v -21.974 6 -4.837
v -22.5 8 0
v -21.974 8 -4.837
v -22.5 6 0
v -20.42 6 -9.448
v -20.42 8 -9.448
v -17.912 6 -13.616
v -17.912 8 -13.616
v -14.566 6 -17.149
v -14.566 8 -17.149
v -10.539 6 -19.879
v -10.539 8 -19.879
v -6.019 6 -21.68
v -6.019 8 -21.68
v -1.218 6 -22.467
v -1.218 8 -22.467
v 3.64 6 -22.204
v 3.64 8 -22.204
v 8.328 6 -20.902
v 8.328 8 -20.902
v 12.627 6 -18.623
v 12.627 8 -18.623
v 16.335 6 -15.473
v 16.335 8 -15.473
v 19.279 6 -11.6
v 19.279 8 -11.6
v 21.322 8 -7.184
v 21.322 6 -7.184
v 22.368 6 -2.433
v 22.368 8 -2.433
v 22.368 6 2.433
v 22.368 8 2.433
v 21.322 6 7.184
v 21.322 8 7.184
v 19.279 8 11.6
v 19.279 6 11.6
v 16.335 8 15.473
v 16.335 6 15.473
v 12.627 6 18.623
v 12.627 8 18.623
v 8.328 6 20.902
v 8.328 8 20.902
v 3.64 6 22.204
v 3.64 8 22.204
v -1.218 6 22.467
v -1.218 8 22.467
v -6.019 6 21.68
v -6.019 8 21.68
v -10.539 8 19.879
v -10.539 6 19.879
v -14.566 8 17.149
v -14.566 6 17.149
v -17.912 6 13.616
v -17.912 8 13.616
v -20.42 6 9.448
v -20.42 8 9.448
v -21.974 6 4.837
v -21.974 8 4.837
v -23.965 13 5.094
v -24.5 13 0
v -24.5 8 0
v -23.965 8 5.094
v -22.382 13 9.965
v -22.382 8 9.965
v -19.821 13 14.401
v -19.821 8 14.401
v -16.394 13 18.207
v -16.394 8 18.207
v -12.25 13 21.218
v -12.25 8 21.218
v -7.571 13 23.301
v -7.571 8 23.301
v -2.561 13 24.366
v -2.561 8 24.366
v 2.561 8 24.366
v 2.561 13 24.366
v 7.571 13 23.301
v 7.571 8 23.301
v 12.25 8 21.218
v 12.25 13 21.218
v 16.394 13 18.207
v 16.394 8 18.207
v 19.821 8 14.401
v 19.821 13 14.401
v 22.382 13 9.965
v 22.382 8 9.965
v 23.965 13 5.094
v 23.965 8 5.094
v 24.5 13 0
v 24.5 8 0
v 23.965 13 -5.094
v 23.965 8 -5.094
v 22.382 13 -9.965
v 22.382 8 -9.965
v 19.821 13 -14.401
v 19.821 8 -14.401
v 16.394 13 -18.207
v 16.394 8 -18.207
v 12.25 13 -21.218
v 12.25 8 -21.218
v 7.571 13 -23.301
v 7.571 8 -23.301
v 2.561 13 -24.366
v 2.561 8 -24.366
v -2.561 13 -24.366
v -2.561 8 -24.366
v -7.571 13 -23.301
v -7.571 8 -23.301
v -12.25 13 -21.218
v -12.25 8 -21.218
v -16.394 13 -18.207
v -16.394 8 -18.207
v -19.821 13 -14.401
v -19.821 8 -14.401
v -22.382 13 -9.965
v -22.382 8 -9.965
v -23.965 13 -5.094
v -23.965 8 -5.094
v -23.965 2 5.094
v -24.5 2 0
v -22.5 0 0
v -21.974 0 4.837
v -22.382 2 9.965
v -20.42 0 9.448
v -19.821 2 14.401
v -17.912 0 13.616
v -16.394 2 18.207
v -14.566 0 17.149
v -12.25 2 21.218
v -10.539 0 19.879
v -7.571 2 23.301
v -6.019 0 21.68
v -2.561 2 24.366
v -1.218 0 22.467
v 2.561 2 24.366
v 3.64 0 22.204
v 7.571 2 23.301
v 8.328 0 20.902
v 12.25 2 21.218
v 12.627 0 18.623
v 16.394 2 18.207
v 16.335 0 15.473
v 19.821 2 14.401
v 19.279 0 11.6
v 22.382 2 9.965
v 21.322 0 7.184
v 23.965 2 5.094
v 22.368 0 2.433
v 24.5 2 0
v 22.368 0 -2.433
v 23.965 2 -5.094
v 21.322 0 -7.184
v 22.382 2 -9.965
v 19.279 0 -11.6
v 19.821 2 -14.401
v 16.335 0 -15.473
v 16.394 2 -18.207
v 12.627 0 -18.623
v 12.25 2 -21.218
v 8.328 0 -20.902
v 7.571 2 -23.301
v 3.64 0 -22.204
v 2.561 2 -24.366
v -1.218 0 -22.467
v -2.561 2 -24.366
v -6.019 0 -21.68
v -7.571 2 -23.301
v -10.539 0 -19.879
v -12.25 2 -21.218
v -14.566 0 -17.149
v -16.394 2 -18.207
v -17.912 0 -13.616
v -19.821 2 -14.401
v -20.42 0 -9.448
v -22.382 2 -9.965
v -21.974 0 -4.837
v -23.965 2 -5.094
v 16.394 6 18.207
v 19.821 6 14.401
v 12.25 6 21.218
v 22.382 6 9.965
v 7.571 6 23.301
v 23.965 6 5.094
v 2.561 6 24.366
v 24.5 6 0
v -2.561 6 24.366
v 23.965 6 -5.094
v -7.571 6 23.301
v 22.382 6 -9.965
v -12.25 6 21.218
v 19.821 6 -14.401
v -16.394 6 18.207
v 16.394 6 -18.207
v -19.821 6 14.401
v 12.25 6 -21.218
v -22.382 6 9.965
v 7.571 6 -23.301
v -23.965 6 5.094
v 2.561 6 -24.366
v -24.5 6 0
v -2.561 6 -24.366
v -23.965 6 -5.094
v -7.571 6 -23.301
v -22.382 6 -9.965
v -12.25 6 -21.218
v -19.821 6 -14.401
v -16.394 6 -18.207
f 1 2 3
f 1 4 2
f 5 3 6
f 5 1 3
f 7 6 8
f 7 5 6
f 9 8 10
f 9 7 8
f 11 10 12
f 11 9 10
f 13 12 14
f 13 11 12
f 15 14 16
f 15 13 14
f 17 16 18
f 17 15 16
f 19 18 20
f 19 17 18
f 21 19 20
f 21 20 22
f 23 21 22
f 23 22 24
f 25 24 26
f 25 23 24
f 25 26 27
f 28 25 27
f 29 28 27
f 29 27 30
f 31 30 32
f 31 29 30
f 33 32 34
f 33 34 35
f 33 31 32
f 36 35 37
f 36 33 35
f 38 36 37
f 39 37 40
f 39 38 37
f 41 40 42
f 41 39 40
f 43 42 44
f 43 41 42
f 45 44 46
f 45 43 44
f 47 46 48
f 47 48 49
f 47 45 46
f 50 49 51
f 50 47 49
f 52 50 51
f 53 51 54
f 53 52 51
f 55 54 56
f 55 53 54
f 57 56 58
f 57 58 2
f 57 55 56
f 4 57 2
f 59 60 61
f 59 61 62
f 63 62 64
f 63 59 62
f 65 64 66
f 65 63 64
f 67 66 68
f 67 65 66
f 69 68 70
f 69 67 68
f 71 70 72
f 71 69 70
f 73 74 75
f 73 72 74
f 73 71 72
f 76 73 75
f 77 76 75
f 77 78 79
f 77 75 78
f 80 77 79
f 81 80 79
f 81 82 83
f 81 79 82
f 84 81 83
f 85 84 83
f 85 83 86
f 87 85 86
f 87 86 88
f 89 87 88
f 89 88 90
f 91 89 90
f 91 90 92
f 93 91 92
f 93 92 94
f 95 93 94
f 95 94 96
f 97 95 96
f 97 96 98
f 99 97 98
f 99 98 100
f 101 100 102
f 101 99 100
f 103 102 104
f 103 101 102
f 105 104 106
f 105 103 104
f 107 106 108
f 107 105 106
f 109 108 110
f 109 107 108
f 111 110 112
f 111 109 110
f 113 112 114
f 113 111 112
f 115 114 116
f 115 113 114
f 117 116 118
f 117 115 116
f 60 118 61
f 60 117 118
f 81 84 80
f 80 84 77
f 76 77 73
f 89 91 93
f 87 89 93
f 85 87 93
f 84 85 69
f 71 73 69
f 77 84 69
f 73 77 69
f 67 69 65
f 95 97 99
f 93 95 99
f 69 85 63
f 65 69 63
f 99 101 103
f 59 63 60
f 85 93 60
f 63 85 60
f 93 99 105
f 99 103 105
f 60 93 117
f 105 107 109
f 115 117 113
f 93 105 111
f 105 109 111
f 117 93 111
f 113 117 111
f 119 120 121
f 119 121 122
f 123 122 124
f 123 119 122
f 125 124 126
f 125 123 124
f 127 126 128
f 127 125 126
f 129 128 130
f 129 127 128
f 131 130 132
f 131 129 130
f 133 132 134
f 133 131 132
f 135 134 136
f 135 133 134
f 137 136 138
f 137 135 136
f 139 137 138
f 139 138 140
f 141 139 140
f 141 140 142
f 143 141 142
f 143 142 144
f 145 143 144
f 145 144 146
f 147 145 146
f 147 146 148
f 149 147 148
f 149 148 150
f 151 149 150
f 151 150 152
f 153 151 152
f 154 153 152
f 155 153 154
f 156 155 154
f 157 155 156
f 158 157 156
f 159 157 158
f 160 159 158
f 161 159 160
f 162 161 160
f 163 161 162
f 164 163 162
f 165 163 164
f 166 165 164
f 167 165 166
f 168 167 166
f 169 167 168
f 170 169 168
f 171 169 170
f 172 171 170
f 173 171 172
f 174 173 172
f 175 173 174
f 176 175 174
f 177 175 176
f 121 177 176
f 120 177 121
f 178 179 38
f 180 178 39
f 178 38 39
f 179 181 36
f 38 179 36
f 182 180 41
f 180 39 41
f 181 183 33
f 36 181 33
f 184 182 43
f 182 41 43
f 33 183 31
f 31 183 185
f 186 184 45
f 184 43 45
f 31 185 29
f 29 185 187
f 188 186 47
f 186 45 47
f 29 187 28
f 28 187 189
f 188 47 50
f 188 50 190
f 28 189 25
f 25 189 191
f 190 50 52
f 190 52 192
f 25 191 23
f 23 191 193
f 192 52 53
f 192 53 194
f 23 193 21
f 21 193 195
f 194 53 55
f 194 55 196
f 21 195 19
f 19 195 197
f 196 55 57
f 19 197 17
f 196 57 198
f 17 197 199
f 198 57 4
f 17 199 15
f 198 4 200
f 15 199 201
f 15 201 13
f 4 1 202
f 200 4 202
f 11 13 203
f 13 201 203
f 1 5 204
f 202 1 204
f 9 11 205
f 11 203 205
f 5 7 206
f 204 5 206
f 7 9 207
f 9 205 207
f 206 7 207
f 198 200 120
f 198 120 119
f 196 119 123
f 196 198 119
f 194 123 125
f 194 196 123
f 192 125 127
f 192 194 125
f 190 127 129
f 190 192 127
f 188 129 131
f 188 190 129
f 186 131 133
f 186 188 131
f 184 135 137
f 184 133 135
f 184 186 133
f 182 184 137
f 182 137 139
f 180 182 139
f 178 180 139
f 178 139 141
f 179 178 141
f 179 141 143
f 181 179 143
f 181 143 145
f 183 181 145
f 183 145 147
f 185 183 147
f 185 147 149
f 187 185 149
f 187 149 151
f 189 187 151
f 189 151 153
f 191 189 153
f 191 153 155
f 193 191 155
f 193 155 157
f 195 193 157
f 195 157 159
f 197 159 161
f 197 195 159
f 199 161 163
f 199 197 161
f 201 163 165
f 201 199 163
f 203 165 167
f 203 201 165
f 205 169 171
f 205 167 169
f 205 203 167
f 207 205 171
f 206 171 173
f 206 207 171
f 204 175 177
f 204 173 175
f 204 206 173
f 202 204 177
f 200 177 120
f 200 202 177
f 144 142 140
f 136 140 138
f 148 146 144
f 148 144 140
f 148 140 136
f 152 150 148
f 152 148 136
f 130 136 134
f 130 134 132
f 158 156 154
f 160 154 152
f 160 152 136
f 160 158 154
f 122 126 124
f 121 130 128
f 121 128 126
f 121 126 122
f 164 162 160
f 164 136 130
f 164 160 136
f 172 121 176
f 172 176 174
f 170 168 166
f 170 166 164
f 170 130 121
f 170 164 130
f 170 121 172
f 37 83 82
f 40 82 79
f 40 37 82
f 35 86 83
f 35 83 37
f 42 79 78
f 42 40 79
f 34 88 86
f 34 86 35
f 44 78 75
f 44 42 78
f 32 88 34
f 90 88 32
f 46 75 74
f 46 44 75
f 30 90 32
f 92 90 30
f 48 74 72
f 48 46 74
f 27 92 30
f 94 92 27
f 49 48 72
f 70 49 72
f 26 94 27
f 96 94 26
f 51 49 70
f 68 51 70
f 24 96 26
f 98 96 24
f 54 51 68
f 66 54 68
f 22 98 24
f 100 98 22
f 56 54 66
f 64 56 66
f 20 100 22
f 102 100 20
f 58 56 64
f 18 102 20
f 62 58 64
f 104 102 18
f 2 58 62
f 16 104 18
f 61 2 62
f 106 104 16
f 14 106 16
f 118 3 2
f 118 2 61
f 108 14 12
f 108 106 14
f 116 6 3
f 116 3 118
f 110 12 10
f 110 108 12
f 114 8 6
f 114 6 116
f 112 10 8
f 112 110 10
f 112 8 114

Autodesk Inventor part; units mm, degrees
ref_plane "YZ Plane" through (0, 0, 0) normal (1, 0, 0) x (0, 1, 0)
ref_plane "XZ Plane" through (0, 0, 0) normal (0, 1, 0) x (-1, 0, 0)
ref_plane "XY Plane" through (0, 0, 0) normal (0, 0, 1) x (1, 0, 0)
sketch "Sketch1" plane through (0, 0, 0) normal (0, 0, 1) x (1, 0, 0)
  line L0 (0, 0) -> (-22.5, 0)
  line L1 (-24.5, 13) -> (0, 13)
  line L2 (0, 13) -> (0, 0)
  line L3 (-22.5, 0) -> (-24.5, 2)
  line L4 (-24.5, 8) -> (-22.5, 8)
  line L5 (-22.5, 8) -> (-22.5, 6)
  line L6 (-22.5, 6) -> (-24.5, 6)
  line L7 (-24.5, 6) -> (-24.5, 8)
  line L8 (-24.5, 2) -> (-24.5, 6)
  line L9 (-24.5, 8) -> (-24.5, 13)
  point P0 (-24.5, 0)
  dimension "d0" = 24.5
  dimension "d1" = 13
  dimension "d2" = 2
  dimension "d3" = 2
  dimension "d4" = 2
  dimension "d5" = 2
  dimension "d6" = 5
  dimension "d7" = 45
revolve "Revolution1" add sketch "Sketch1" angle 360 about axis through (0, 13, 0) along (0, -1, 0) contours L0 L3 L8 L6 L5 L4 L9 L1 L2
equation "\"d3\" = d2"
properties part number "bulkhead"
